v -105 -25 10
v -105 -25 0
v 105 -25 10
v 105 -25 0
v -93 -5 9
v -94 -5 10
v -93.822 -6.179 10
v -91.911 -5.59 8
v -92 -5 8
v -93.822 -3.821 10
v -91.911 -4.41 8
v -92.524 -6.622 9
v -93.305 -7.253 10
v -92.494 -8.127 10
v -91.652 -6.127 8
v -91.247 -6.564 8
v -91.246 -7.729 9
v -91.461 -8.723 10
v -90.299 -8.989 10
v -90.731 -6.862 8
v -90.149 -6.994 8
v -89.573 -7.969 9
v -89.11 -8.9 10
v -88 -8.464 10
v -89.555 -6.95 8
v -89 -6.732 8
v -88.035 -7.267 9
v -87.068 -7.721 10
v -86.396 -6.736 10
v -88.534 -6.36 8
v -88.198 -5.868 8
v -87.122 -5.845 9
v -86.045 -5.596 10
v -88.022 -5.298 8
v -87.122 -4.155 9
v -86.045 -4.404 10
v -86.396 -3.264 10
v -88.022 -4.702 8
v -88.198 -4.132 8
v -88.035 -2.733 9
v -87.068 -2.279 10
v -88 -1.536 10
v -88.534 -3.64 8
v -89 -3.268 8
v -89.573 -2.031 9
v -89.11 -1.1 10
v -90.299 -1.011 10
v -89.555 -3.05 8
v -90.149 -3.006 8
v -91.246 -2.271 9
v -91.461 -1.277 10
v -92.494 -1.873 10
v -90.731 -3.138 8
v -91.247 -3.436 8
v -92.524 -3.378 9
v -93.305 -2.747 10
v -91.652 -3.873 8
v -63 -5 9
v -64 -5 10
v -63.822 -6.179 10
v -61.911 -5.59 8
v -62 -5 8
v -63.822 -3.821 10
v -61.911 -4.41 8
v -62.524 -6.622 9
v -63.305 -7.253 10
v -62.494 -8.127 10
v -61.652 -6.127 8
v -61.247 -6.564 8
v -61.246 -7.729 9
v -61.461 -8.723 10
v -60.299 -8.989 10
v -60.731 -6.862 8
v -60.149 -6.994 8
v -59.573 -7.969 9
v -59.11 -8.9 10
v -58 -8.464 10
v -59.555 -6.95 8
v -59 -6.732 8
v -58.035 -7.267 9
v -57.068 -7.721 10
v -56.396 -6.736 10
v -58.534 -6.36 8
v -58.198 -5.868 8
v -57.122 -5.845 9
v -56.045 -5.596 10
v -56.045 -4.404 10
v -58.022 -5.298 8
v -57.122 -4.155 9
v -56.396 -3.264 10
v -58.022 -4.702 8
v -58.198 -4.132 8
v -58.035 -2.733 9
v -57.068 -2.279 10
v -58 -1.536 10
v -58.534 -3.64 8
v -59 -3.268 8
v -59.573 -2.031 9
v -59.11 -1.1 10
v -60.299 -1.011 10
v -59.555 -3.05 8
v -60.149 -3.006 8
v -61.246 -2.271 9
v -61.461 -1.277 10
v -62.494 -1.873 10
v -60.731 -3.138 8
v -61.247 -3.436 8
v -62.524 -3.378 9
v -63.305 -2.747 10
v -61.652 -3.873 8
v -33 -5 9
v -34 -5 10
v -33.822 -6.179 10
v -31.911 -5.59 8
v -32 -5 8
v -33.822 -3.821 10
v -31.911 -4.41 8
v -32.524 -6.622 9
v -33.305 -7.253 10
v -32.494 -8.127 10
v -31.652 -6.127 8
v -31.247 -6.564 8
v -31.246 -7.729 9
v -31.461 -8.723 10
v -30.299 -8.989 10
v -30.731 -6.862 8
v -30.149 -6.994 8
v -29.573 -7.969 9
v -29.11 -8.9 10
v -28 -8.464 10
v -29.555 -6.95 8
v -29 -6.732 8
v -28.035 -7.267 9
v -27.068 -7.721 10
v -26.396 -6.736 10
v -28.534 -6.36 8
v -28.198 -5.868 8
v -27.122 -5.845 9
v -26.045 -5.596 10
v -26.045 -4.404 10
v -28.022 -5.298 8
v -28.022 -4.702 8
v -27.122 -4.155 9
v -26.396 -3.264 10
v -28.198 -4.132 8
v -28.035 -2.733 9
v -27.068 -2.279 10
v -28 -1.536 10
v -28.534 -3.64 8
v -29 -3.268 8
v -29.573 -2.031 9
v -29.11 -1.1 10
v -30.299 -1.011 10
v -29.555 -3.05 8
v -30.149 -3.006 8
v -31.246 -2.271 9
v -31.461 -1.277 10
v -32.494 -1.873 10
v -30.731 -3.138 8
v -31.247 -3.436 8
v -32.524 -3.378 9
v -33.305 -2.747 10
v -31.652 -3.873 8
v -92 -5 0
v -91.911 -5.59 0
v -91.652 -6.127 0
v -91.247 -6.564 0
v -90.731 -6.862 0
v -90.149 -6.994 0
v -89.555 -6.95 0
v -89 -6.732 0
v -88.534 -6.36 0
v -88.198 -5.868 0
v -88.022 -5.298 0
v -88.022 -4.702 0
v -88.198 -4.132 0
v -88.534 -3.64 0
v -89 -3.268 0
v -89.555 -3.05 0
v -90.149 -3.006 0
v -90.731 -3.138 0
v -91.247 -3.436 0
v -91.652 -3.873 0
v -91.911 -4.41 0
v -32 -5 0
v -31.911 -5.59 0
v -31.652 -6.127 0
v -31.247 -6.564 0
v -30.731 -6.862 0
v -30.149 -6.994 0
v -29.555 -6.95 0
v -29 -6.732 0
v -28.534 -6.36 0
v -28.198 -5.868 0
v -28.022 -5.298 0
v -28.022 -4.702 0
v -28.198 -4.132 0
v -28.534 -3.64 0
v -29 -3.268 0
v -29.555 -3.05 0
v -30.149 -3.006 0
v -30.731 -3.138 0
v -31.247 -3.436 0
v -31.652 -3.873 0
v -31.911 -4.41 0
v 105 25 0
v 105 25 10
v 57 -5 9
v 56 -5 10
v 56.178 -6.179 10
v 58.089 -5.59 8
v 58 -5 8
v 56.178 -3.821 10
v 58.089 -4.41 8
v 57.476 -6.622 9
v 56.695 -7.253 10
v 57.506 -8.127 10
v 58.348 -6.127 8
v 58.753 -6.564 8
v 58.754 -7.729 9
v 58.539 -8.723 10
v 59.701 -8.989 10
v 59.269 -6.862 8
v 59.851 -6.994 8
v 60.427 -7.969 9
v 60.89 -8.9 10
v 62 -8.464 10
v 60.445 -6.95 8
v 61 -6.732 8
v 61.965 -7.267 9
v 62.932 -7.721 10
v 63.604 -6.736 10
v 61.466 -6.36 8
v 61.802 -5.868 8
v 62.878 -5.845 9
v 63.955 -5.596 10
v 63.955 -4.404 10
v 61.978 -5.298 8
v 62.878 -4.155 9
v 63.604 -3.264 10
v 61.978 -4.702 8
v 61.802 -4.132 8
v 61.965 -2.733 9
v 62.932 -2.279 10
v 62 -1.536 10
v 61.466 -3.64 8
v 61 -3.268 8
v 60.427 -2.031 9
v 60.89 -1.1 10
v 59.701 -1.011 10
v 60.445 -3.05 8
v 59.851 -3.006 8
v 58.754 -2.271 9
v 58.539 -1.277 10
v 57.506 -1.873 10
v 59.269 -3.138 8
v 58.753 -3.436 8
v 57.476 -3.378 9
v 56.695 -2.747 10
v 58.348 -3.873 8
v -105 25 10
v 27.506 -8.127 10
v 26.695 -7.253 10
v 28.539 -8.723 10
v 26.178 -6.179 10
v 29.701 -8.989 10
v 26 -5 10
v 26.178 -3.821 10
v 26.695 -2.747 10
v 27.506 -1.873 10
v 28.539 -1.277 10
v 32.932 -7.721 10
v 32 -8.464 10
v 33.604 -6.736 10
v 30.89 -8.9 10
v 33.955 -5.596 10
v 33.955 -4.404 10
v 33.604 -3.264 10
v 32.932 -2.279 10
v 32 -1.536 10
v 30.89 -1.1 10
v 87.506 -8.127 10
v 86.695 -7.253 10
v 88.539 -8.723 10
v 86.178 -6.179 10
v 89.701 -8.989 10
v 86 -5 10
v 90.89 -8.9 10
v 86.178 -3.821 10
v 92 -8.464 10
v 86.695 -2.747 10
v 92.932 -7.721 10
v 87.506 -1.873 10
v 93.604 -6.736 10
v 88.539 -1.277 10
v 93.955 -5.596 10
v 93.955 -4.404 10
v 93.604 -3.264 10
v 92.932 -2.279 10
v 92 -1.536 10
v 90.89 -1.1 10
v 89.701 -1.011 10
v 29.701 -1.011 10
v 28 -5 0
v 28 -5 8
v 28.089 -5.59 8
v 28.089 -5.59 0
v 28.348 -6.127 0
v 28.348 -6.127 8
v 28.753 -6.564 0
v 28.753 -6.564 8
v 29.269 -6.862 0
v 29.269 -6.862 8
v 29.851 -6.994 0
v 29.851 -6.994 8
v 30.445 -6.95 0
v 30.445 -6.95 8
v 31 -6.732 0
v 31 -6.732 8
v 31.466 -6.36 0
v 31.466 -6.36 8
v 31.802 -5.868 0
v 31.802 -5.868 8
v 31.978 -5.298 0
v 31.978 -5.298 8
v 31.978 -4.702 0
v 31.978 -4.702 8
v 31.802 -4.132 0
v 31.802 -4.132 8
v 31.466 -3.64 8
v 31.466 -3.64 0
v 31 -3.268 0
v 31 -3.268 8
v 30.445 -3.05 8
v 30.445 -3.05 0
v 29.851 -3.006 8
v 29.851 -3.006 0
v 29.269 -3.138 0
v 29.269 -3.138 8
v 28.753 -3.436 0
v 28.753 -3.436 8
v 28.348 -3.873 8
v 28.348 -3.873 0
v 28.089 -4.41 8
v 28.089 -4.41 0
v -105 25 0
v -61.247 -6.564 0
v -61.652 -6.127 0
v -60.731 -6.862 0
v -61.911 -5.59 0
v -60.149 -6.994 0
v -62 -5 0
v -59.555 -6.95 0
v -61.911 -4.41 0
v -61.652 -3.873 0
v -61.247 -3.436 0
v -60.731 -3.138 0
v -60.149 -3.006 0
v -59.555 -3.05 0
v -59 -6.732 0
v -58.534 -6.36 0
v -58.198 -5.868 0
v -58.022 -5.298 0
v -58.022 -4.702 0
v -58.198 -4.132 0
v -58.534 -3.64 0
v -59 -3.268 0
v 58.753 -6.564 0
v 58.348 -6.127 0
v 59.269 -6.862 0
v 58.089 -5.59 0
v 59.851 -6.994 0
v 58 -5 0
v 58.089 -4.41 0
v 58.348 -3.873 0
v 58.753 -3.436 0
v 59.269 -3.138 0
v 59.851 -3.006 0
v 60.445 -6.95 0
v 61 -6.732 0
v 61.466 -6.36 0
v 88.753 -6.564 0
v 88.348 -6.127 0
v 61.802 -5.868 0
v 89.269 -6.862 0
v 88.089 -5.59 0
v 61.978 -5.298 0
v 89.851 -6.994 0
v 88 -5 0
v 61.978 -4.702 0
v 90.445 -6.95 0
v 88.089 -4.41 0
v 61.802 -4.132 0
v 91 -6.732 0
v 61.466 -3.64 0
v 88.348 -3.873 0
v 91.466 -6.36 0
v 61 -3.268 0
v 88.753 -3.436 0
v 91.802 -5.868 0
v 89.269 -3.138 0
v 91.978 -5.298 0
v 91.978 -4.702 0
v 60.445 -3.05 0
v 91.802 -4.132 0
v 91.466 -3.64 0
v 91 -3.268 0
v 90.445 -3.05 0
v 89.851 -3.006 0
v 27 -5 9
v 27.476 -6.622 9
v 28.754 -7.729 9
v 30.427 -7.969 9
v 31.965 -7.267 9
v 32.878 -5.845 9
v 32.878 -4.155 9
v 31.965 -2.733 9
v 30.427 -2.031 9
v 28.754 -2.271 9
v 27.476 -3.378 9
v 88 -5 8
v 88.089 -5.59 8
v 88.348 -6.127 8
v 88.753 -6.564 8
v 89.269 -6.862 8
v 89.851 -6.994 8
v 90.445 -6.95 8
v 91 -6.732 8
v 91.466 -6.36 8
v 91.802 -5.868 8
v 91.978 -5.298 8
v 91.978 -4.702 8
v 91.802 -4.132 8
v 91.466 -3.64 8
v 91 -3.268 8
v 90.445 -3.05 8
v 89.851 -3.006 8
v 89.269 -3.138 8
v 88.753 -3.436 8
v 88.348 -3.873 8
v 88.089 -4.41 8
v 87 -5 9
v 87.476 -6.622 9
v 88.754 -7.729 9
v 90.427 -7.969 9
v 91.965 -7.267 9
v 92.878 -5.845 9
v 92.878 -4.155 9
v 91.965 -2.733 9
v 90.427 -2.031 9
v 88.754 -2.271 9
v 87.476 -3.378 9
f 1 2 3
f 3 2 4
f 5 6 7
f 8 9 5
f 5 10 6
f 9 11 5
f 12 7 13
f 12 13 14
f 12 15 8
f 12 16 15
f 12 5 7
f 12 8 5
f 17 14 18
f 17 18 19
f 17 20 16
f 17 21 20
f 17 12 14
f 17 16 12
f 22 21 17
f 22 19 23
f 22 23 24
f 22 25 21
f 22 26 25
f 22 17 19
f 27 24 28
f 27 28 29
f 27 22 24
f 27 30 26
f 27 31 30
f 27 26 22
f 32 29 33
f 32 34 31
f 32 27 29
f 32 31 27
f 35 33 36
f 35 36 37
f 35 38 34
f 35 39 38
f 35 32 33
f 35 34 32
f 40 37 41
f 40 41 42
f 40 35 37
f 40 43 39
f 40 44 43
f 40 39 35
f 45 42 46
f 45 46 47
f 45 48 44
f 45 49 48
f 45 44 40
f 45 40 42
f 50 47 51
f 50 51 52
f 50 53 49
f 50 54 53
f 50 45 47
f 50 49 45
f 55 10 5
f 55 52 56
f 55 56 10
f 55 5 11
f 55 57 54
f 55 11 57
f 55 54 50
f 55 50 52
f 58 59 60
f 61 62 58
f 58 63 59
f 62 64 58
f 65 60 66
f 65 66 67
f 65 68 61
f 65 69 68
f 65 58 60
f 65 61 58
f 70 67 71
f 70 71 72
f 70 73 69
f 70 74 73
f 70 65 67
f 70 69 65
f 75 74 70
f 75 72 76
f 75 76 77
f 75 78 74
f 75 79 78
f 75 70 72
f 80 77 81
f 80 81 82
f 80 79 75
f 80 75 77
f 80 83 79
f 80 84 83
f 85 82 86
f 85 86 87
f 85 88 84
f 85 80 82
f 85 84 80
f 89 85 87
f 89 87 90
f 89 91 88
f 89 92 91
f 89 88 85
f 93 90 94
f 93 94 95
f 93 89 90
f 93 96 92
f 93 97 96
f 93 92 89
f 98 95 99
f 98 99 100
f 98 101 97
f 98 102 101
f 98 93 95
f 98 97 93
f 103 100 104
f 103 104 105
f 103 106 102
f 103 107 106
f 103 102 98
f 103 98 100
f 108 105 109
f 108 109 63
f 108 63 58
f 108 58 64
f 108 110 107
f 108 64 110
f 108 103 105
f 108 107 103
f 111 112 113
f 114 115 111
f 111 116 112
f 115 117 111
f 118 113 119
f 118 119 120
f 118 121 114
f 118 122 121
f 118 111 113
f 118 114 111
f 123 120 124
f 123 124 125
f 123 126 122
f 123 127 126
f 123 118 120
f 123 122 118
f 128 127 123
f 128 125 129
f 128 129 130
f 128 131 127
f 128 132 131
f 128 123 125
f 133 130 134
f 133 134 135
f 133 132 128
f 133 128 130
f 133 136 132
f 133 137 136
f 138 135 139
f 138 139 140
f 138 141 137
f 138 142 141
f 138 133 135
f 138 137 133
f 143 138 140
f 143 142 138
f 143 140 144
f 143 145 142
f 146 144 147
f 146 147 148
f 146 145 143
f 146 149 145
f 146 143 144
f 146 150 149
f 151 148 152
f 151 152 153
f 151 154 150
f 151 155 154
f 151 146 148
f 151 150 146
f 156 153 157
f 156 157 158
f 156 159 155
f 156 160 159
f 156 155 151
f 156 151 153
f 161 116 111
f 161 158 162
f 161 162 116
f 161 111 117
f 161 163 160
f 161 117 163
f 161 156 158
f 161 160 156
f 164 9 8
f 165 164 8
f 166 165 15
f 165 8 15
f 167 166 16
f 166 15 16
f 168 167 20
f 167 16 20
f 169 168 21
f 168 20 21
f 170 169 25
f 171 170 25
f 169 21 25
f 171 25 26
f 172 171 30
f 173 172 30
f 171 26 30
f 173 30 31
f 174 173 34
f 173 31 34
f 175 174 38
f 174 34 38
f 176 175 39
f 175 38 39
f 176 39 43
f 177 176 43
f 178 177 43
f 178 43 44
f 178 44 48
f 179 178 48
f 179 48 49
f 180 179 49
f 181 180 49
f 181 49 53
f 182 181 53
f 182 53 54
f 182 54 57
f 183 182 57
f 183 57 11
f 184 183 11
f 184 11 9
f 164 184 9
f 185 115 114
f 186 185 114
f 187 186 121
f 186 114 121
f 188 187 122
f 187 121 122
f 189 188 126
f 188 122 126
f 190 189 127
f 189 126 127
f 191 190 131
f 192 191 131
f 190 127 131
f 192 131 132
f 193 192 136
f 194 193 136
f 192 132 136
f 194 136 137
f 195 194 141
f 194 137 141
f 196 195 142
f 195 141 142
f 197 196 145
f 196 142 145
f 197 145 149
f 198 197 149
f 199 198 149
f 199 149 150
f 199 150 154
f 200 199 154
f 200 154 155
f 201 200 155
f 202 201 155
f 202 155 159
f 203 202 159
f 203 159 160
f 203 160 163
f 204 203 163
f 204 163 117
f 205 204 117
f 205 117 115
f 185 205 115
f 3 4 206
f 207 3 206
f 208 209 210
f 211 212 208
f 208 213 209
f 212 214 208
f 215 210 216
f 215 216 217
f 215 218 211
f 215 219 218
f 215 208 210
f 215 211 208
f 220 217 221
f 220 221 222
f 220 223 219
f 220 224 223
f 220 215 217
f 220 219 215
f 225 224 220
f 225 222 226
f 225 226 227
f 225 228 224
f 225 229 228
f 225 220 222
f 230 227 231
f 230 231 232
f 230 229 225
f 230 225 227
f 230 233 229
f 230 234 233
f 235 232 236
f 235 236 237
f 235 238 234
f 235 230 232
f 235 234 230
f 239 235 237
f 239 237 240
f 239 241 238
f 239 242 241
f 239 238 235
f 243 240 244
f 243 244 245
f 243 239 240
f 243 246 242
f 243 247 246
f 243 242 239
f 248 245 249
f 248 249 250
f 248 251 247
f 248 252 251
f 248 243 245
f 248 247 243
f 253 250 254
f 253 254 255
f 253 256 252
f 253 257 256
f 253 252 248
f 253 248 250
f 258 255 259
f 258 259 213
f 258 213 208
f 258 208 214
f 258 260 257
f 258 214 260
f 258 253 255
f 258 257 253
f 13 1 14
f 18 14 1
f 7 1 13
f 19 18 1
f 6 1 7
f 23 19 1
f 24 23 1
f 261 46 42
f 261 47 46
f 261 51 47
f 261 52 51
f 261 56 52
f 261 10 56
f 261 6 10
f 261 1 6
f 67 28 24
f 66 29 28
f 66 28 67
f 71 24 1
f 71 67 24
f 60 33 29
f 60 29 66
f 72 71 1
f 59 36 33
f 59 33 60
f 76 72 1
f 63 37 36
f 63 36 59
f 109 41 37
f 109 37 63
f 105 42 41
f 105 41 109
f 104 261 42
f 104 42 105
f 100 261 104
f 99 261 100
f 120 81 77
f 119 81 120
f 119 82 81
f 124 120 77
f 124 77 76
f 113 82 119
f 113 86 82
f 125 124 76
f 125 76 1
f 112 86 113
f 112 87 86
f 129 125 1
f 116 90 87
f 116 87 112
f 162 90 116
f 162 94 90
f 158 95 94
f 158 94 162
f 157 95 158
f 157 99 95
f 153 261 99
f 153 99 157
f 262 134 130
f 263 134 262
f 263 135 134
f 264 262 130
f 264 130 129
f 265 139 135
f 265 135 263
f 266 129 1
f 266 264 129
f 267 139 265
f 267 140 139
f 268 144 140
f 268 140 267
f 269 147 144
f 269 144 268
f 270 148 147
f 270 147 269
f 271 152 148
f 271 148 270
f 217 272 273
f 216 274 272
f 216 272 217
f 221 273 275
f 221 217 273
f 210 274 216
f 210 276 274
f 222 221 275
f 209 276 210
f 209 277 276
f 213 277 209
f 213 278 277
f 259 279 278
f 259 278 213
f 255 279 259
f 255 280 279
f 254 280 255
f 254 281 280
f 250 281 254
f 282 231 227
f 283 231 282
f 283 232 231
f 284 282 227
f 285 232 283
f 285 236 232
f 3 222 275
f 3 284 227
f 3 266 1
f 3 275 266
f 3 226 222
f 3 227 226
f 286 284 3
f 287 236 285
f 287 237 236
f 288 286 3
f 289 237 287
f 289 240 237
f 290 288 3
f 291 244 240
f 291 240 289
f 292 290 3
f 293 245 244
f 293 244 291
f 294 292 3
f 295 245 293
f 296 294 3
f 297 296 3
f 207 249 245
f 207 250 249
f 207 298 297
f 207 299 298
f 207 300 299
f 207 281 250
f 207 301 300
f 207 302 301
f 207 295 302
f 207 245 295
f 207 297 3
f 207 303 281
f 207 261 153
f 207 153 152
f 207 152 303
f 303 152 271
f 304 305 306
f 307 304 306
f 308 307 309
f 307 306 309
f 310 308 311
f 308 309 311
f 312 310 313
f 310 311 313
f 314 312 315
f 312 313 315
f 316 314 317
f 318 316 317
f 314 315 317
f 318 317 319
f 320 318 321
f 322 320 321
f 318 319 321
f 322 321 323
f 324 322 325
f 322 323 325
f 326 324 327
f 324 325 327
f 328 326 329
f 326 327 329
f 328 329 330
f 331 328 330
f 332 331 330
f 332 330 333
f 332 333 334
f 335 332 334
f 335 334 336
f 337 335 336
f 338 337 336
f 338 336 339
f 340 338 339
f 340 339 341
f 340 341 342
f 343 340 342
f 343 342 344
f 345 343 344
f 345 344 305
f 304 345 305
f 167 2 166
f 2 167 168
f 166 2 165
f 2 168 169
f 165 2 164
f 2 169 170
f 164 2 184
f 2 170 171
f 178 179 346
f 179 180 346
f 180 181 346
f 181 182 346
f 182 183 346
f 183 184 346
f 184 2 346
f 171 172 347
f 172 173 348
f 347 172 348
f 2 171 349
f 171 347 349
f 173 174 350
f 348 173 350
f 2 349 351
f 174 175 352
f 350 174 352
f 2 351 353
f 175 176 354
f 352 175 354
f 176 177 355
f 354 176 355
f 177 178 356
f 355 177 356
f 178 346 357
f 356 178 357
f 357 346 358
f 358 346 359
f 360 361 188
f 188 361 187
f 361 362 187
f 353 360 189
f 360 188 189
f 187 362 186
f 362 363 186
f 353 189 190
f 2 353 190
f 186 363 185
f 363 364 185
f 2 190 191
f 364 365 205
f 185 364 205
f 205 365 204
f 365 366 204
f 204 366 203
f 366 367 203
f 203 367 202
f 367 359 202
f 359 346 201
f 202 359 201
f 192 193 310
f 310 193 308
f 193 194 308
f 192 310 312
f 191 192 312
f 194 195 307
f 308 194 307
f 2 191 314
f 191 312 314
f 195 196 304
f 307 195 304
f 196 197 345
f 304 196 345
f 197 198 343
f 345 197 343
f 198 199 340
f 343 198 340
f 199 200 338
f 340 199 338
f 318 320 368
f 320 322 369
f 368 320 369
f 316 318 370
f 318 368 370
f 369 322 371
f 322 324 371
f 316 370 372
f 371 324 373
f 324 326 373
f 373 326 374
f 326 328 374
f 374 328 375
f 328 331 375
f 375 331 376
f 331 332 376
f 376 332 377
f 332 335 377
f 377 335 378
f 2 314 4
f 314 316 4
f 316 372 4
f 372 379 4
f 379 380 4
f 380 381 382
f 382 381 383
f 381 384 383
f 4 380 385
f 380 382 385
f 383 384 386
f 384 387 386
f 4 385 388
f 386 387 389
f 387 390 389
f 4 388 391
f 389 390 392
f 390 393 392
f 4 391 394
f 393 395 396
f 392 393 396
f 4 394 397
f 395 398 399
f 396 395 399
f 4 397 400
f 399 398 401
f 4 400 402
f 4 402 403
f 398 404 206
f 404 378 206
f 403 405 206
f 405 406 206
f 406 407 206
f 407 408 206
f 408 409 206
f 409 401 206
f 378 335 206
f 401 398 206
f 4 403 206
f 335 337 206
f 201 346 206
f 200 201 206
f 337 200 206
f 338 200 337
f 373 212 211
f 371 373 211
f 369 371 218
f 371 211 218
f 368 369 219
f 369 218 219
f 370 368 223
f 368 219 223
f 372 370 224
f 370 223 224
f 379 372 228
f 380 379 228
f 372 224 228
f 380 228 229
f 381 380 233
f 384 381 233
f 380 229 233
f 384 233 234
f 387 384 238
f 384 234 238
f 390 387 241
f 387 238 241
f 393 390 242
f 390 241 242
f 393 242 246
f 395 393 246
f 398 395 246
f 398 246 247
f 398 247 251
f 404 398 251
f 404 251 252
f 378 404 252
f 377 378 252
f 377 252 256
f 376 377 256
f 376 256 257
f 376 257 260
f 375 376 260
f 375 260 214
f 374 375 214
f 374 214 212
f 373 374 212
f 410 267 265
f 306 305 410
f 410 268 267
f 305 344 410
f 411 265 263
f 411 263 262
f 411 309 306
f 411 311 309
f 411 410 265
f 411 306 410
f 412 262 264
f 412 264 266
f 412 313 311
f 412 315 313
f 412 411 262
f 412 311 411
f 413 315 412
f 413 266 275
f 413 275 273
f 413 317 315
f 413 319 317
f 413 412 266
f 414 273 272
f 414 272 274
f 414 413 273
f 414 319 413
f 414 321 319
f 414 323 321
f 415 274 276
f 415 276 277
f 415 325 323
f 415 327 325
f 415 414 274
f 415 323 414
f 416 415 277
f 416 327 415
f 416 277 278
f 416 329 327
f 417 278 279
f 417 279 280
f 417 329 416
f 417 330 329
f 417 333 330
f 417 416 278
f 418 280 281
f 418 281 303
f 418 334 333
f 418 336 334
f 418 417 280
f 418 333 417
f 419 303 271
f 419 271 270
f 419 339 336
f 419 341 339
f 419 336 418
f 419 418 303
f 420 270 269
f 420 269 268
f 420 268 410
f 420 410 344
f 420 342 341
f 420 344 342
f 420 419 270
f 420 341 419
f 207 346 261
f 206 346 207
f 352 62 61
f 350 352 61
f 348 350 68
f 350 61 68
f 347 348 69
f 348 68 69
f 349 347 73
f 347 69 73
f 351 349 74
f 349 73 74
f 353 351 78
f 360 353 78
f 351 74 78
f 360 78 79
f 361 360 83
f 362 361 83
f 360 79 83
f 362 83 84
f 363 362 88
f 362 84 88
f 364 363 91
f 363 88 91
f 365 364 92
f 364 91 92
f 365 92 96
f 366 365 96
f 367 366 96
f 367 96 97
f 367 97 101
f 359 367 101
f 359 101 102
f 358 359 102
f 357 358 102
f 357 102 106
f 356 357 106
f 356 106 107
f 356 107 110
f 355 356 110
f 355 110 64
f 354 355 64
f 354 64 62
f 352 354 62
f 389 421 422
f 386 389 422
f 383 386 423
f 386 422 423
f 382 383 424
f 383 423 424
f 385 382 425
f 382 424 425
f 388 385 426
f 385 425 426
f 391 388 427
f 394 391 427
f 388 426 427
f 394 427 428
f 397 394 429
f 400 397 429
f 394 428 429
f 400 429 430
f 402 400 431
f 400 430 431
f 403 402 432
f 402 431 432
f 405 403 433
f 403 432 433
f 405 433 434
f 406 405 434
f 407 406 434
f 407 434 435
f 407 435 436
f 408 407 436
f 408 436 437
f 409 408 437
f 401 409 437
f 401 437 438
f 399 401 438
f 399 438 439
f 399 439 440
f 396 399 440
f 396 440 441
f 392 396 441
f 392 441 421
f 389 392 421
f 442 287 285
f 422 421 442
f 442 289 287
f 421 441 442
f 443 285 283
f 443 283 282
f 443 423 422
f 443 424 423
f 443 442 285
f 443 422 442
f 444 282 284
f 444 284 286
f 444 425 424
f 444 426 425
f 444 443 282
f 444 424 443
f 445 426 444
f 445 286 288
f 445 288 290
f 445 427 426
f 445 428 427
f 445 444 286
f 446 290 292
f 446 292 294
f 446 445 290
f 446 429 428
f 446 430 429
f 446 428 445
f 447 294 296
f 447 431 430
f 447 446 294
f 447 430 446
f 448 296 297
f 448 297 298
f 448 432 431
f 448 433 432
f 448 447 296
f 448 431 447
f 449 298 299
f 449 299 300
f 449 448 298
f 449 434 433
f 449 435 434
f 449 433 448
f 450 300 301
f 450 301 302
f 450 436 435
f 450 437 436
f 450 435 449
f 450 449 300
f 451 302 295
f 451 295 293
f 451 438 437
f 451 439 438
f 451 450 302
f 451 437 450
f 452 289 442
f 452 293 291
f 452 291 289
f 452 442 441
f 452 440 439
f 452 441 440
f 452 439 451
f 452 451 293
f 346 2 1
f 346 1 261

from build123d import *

# Parameters (mm, degrees)
F0_W     = 210
F0_H     = 50
F1_DEPTH = 10
F3_DEPTH = 10.001
F4_SIZE  = 2


with BuildPart() as f1:
    # F0 (on Top) → F1 (new body)
    with BuildSketch(Plane.XY):
        Rectangle(F0_W, F0_H)
    extrude(amount=F1_DEPTH)

    # F2 (on face) → F3 (cut, through all)
    with BuildSketch(Plane.XY.offset(10)):
        with BuildLine():
            ThreePointArc((-88, -5), (-90, -3), (-92, -5))
            Line((-92, -5), (-88, -5))
        make_face()
        with BuildLine():
            Line((-88, -5), (-92, -5))
            ThreePointArc((-92, -5), (-90, -7), (-88, -5))
        make_face()
        with BuildLine():
            ThreePointArc((-58, -5), (-60, -3), (-62, -5))
            Line((-62, -5), (-58, -5))
        make_face()
        with BuildLine():
            Line((-58, -5), (-62, -5))
            ThreePointArc((-62, -5), (-60, -7), (-58, -5))
        make_face()
        with BuildLine():
            ThreePointArc((-28, -5), (-30, -3), (-32, -5))
            Line((-32, -5), (-28, -5))
        make_face()
        with BuildLine():
            Line((-28, -5), (-32, -5))
            ThreePointArc((-32, -5), (-30, -7), (-28, -5))
        make_face()
        with BuildLine():
            ThreePointArc((32, -5), (30, -3), (28, -5))
            Line((28, -5), (32, -5))
        make_face()
        with BuildLine():
            Line((32, -5), (28, -5))
            ThreePointArc((28, -5), (30, -7), (32, -5))
        make_face()
        with BuildLine():
            ThreePointArc((62, -5), (60, -3), (58, -5))
            Line((58, -5), (62, -5))
        make_face()
        with BuildLine():
            Line((62, -5), (58, -5))
            ThreePointArc((58, -5), (60, -7), (62, -5))
        make_face()
        with BuildLine():
            Line((88, -5), (92, -5))
            ThreePointArc((92, -5), (90, -3), (88, -5))
        make_face()
        with BuildLine():
            ThreePointArc((88, -5), (90, -7), (92, -5))
            Line((92, -5), (88, -5))
        make_face()
    extrude(amount=-F3_DEPTH, mode=Mode.SUBTRACT)

    # F4
    f4_edges = [f1.edges().sort_by_distance(p)[0] for p in [
        (-88, -5, 10),
        (-58, -5, 10),
        (-28, -5, 10),
        (32, -5, 10),
        (62, -5, 10),
        (92, -5, 10),
    ]]
    chamfer(f4_edges, length=F4_SIZE)


solid = f1.part
